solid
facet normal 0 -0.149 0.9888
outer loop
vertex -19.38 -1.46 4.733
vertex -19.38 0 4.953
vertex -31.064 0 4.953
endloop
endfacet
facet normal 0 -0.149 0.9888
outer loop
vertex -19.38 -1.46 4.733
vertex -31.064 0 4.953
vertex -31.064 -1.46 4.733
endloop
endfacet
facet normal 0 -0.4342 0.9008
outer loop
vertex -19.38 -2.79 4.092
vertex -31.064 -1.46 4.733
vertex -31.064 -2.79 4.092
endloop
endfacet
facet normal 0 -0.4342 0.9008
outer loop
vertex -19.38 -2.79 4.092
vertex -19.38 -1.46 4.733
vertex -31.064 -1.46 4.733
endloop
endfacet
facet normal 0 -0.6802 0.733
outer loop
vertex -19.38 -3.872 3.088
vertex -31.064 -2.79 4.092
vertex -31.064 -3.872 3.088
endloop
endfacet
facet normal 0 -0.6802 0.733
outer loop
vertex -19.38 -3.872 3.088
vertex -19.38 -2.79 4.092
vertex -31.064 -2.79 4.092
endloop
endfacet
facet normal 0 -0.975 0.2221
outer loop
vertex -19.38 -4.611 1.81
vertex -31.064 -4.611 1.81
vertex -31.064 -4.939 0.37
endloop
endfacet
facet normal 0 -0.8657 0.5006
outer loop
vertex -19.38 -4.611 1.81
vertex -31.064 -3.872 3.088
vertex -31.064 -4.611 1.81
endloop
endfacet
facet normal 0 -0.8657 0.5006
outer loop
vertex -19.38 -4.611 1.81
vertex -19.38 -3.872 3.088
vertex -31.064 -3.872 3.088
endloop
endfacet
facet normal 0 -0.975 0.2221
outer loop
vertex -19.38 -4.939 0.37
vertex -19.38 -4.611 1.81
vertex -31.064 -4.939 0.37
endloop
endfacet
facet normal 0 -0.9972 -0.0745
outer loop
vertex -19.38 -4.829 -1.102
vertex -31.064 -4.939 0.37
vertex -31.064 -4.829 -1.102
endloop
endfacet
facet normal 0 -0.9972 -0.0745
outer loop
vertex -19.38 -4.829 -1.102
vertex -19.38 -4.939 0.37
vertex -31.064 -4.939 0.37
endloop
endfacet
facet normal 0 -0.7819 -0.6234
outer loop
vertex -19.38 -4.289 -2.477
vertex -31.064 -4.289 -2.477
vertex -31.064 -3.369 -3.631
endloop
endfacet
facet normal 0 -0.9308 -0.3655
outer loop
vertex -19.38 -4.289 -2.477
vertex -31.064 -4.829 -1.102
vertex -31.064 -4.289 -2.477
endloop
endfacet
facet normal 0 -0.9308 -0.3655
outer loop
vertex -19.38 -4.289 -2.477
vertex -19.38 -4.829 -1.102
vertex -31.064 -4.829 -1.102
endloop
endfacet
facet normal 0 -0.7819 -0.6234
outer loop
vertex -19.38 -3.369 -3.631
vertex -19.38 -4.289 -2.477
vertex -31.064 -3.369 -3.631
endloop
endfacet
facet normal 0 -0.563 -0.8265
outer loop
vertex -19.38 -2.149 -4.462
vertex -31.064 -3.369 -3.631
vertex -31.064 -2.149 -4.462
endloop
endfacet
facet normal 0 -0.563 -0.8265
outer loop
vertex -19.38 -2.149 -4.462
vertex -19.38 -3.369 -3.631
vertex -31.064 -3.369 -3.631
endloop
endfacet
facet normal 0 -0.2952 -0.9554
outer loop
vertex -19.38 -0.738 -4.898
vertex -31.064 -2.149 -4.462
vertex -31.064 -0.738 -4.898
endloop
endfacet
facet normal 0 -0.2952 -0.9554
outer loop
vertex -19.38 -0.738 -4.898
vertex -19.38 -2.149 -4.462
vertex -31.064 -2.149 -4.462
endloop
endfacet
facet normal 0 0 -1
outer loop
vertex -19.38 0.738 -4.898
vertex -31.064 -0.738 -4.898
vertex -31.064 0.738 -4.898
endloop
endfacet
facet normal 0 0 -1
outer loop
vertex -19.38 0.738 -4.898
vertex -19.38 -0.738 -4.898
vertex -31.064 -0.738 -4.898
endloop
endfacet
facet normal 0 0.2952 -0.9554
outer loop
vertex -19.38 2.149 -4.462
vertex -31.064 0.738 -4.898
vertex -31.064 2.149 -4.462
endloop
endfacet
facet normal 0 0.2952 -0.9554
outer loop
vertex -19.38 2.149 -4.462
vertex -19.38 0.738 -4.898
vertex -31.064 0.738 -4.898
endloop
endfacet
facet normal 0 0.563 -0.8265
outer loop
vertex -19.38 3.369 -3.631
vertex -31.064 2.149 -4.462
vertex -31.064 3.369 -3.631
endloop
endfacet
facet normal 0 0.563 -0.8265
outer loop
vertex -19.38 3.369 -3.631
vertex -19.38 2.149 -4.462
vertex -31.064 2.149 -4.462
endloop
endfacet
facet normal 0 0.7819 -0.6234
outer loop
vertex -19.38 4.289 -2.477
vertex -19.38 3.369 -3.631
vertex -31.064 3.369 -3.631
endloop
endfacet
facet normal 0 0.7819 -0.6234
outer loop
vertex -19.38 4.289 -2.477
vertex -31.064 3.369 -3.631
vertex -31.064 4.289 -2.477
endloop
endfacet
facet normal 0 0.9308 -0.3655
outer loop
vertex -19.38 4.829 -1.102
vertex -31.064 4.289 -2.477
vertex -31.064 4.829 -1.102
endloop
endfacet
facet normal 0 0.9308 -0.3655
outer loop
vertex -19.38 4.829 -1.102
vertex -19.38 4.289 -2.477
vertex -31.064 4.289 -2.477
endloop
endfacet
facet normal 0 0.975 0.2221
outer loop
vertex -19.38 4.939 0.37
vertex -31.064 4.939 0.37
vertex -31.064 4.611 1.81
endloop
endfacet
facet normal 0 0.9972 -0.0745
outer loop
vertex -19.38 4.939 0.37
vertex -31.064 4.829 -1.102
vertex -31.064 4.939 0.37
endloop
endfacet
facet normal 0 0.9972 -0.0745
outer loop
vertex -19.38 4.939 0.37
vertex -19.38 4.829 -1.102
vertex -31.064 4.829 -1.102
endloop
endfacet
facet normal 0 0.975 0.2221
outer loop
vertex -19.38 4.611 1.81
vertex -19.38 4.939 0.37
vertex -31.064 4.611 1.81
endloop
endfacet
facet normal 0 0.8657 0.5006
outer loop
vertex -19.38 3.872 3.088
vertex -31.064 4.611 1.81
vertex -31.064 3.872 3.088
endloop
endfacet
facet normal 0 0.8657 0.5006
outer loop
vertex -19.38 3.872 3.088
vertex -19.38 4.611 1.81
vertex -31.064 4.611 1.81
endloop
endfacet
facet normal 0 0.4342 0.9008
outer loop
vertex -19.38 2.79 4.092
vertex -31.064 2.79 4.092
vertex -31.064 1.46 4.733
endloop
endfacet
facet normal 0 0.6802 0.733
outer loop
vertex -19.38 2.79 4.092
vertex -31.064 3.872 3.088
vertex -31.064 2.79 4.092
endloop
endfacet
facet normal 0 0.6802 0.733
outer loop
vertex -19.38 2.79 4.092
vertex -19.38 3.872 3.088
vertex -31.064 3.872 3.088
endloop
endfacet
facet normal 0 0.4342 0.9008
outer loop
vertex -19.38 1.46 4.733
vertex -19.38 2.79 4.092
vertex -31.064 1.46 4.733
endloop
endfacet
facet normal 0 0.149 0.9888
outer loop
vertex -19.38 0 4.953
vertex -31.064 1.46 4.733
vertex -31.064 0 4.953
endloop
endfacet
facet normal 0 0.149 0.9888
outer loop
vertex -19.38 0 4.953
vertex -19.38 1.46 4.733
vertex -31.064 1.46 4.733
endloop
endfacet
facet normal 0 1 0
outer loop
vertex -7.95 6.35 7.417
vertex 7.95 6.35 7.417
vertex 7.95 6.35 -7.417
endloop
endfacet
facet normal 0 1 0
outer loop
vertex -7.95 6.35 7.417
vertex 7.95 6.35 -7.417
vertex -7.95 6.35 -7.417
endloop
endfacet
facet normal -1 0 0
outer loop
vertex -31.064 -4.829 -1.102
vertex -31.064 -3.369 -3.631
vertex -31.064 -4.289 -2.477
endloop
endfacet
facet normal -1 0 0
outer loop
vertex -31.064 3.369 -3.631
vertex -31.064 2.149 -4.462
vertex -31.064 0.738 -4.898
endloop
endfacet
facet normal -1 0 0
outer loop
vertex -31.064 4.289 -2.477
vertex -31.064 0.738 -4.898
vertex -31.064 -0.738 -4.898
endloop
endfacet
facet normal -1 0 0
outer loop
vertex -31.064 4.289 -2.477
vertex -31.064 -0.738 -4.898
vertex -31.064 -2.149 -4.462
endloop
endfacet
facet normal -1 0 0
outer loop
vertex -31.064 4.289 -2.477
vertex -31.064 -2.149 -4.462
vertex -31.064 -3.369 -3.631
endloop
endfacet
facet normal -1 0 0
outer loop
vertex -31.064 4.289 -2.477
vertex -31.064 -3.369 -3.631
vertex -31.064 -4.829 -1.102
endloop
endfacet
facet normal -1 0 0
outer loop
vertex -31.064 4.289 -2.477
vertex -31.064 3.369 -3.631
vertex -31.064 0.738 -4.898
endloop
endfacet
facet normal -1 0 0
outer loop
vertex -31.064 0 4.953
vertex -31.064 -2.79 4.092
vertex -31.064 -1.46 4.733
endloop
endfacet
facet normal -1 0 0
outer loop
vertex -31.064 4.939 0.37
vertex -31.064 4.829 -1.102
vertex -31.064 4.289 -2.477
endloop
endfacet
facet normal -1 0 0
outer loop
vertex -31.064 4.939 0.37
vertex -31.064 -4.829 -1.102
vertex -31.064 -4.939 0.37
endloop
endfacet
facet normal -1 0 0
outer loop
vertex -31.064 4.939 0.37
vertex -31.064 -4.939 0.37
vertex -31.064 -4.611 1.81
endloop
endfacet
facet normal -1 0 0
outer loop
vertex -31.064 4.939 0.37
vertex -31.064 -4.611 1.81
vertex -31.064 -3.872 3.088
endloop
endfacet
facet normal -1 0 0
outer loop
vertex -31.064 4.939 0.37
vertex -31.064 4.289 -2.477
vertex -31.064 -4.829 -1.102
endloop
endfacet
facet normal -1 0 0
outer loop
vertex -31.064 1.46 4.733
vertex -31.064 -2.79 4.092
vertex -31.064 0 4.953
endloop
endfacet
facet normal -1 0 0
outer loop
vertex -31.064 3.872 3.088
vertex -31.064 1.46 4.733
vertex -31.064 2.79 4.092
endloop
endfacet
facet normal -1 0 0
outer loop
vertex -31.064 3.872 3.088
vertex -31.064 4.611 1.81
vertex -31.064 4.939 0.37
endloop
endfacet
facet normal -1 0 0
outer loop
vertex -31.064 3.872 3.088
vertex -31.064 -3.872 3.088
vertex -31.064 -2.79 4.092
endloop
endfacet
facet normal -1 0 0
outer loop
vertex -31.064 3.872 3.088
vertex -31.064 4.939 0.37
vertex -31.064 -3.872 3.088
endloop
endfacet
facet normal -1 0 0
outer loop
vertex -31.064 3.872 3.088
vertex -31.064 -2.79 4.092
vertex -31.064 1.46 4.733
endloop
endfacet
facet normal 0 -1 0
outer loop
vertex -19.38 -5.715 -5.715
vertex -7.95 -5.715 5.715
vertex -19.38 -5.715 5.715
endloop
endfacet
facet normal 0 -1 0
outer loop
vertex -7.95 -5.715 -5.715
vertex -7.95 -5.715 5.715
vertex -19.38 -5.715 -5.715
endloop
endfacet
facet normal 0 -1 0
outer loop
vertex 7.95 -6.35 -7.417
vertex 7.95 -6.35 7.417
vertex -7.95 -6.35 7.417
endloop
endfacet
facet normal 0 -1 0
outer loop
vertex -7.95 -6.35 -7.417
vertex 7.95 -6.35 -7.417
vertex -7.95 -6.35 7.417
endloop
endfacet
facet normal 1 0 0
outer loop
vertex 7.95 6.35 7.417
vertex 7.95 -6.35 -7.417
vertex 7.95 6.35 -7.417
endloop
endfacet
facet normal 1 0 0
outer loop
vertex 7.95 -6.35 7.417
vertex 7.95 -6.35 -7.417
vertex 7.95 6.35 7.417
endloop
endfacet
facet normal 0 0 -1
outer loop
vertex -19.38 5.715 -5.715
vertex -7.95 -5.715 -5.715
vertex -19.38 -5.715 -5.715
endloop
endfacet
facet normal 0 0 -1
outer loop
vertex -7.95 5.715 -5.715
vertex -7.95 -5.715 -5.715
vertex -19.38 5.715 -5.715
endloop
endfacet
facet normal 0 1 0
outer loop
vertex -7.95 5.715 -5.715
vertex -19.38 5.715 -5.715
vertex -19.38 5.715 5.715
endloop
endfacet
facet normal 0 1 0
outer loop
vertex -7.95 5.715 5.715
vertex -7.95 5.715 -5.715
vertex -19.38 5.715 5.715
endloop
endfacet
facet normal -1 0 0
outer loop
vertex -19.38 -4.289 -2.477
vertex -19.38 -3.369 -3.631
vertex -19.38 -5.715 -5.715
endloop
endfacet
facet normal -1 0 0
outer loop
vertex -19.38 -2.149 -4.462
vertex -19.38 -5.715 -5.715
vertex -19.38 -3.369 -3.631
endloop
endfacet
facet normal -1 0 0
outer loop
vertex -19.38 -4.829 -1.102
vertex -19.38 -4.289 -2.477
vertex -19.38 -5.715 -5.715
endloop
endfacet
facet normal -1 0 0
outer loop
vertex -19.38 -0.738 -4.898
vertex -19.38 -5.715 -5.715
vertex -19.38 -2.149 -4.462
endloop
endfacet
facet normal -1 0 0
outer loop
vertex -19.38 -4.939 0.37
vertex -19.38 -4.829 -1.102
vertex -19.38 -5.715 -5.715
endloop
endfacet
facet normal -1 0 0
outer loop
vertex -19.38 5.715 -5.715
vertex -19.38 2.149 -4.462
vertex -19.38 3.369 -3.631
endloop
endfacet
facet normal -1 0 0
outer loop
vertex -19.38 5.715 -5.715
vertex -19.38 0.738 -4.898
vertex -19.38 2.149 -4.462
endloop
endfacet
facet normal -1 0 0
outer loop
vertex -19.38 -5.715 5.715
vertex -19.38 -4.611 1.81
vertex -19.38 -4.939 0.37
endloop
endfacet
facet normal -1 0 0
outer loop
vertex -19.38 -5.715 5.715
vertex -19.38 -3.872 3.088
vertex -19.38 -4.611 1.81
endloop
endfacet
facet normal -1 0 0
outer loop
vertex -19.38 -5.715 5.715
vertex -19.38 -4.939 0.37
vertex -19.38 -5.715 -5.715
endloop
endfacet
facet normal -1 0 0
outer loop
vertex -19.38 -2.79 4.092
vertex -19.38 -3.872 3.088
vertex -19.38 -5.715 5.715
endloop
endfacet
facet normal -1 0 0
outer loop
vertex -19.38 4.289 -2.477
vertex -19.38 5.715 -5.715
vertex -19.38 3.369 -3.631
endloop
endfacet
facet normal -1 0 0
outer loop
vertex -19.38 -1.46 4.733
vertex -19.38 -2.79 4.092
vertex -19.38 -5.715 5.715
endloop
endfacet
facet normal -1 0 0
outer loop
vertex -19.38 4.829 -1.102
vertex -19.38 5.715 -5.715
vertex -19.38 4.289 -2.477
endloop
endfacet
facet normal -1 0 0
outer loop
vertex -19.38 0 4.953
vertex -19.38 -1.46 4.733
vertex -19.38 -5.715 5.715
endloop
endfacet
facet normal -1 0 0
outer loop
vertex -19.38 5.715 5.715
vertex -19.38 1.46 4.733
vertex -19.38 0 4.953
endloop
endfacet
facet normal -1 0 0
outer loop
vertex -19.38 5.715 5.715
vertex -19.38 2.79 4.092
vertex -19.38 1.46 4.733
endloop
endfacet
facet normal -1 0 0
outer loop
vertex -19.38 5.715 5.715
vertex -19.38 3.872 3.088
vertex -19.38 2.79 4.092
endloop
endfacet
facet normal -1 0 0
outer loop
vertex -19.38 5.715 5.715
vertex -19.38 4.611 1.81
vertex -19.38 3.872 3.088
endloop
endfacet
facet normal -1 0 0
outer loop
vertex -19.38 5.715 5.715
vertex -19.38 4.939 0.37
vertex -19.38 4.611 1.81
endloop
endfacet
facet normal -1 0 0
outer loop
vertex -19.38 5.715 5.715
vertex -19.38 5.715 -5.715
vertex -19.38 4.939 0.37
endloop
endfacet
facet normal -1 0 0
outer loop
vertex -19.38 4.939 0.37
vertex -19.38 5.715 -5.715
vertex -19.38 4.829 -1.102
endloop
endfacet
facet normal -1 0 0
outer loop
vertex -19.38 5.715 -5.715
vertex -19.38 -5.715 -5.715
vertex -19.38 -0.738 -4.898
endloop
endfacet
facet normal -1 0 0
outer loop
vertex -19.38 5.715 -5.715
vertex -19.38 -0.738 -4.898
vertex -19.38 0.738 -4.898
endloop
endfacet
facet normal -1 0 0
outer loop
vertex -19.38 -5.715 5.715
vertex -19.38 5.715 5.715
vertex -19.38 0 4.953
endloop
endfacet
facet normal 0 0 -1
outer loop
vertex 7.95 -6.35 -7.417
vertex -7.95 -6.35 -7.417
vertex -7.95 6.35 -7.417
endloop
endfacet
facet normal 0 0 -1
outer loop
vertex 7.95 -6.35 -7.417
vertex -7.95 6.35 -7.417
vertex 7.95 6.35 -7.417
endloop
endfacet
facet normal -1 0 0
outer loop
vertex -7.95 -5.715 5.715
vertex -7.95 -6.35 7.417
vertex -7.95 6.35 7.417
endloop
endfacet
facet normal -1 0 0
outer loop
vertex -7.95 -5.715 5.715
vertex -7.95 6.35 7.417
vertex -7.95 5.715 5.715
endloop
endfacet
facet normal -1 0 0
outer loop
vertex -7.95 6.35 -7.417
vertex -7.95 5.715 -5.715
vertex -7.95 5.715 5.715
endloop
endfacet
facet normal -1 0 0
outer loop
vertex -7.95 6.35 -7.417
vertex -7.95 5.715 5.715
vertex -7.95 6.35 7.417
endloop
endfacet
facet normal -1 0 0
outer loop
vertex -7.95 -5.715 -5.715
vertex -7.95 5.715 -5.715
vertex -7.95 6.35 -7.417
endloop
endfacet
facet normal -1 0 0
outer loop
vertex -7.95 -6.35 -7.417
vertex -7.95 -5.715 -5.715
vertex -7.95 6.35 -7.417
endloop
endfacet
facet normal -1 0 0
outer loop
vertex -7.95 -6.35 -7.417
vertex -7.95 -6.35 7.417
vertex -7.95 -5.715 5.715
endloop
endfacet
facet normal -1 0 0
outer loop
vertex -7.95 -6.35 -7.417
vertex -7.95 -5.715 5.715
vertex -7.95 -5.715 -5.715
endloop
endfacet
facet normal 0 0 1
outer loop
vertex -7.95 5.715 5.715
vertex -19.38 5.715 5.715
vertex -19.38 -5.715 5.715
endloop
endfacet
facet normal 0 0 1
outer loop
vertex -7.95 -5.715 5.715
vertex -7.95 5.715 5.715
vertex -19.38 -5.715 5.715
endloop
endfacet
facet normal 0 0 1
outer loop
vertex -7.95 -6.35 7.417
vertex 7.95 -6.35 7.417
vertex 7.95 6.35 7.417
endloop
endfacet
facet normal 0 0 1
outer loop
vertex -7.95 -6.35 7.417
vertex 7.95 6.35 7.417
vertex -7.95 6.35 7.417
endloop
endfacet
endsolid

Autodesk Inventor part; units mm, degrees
ref_plane "YZ Plane" through (0, 0, 0) normal (1, 0, 0) x (0, 1, 0)
ref_plane "XZ Plane" through (0, 0, 0) normal (0, 1, 0) x (-1, 0, 0)
ref_plane "XY Plane" through (0, 0, 0) normal (0, 0, 1) x (1, 0, 0)
sketch "Sketch1" plane through (0, 0, 0) normal (0, 1, 0) x (-1, 0, 0)
  line L0 (7.9502, -7.4168) -> (-7.9502, -7.4168)
  line L1 (-7.9502, -7.4168) -> (-7.9502, 7.4168)
  line L2 (-7.9502, 7.4168) -> (7.9502, 7.4168)
  line L3 (7.9502, 7.4168) -> (7.9502, -7.4168)
  point P0 (0, 0)
  point P1 (7.9502, 0)
  point P2 (0, -7.4168)
  dimension "d0" = 14.8336
  dimension "d1" = 15.9004
extrude "Extrusion1" add sketch "Sketch1" along normal mid plane 12.7
sketch "Sketch2" plane through (-7.9502, -6.35, 7.4168) normal (-1, 0, 0) x (0, 0, 1)
  line L0 (0, 0) -> (0, 12.7) projected
  line L1 (-14.8336, 12.7) -> (0, 12.7) projected
  line L2 (-14.8336, 0) -> (-14.8336, 12.7) projected
  line L3 (0, 0) -> (-14.8336, 0) projected
  line L4 (-13.1318, 12.065) -> (-1.7018, 12.065)
  line L5 (-1.7018, 12.065) -> (-1.7018, 0.635)
  line L6 (-1.7018, 0.635) -> (-13.1318, 0.635)
  line L7 (-13.1318, 0.635) -> (-13.1318, 12.065)
  point P0 (-7.4168, 6.35)
  point P1 (-13.1318, 6.35)
  point P2 (-7.4168, 12.065)
  dimension "d11" = 11.43
  dimension "d12" = 11.43
extrude "Extrusion2" add sketch "Sketch2" along normal blind 11.43 contours L4 L5 L6 L7
sketch "Sketch3" plane through (-19.3802, -6.35, 7.4168) normal (-1, 0, 0) x (0, 0, 1)
  circle A0 centre (-7.4168, 6.35) radius 4.953
  dimension "d10" = 9.906
extrude "Extrusion3" add sketch "Sketch3" along normal blind 11.684
equation "\"d12\" = d11"
properties part number "Plug"
